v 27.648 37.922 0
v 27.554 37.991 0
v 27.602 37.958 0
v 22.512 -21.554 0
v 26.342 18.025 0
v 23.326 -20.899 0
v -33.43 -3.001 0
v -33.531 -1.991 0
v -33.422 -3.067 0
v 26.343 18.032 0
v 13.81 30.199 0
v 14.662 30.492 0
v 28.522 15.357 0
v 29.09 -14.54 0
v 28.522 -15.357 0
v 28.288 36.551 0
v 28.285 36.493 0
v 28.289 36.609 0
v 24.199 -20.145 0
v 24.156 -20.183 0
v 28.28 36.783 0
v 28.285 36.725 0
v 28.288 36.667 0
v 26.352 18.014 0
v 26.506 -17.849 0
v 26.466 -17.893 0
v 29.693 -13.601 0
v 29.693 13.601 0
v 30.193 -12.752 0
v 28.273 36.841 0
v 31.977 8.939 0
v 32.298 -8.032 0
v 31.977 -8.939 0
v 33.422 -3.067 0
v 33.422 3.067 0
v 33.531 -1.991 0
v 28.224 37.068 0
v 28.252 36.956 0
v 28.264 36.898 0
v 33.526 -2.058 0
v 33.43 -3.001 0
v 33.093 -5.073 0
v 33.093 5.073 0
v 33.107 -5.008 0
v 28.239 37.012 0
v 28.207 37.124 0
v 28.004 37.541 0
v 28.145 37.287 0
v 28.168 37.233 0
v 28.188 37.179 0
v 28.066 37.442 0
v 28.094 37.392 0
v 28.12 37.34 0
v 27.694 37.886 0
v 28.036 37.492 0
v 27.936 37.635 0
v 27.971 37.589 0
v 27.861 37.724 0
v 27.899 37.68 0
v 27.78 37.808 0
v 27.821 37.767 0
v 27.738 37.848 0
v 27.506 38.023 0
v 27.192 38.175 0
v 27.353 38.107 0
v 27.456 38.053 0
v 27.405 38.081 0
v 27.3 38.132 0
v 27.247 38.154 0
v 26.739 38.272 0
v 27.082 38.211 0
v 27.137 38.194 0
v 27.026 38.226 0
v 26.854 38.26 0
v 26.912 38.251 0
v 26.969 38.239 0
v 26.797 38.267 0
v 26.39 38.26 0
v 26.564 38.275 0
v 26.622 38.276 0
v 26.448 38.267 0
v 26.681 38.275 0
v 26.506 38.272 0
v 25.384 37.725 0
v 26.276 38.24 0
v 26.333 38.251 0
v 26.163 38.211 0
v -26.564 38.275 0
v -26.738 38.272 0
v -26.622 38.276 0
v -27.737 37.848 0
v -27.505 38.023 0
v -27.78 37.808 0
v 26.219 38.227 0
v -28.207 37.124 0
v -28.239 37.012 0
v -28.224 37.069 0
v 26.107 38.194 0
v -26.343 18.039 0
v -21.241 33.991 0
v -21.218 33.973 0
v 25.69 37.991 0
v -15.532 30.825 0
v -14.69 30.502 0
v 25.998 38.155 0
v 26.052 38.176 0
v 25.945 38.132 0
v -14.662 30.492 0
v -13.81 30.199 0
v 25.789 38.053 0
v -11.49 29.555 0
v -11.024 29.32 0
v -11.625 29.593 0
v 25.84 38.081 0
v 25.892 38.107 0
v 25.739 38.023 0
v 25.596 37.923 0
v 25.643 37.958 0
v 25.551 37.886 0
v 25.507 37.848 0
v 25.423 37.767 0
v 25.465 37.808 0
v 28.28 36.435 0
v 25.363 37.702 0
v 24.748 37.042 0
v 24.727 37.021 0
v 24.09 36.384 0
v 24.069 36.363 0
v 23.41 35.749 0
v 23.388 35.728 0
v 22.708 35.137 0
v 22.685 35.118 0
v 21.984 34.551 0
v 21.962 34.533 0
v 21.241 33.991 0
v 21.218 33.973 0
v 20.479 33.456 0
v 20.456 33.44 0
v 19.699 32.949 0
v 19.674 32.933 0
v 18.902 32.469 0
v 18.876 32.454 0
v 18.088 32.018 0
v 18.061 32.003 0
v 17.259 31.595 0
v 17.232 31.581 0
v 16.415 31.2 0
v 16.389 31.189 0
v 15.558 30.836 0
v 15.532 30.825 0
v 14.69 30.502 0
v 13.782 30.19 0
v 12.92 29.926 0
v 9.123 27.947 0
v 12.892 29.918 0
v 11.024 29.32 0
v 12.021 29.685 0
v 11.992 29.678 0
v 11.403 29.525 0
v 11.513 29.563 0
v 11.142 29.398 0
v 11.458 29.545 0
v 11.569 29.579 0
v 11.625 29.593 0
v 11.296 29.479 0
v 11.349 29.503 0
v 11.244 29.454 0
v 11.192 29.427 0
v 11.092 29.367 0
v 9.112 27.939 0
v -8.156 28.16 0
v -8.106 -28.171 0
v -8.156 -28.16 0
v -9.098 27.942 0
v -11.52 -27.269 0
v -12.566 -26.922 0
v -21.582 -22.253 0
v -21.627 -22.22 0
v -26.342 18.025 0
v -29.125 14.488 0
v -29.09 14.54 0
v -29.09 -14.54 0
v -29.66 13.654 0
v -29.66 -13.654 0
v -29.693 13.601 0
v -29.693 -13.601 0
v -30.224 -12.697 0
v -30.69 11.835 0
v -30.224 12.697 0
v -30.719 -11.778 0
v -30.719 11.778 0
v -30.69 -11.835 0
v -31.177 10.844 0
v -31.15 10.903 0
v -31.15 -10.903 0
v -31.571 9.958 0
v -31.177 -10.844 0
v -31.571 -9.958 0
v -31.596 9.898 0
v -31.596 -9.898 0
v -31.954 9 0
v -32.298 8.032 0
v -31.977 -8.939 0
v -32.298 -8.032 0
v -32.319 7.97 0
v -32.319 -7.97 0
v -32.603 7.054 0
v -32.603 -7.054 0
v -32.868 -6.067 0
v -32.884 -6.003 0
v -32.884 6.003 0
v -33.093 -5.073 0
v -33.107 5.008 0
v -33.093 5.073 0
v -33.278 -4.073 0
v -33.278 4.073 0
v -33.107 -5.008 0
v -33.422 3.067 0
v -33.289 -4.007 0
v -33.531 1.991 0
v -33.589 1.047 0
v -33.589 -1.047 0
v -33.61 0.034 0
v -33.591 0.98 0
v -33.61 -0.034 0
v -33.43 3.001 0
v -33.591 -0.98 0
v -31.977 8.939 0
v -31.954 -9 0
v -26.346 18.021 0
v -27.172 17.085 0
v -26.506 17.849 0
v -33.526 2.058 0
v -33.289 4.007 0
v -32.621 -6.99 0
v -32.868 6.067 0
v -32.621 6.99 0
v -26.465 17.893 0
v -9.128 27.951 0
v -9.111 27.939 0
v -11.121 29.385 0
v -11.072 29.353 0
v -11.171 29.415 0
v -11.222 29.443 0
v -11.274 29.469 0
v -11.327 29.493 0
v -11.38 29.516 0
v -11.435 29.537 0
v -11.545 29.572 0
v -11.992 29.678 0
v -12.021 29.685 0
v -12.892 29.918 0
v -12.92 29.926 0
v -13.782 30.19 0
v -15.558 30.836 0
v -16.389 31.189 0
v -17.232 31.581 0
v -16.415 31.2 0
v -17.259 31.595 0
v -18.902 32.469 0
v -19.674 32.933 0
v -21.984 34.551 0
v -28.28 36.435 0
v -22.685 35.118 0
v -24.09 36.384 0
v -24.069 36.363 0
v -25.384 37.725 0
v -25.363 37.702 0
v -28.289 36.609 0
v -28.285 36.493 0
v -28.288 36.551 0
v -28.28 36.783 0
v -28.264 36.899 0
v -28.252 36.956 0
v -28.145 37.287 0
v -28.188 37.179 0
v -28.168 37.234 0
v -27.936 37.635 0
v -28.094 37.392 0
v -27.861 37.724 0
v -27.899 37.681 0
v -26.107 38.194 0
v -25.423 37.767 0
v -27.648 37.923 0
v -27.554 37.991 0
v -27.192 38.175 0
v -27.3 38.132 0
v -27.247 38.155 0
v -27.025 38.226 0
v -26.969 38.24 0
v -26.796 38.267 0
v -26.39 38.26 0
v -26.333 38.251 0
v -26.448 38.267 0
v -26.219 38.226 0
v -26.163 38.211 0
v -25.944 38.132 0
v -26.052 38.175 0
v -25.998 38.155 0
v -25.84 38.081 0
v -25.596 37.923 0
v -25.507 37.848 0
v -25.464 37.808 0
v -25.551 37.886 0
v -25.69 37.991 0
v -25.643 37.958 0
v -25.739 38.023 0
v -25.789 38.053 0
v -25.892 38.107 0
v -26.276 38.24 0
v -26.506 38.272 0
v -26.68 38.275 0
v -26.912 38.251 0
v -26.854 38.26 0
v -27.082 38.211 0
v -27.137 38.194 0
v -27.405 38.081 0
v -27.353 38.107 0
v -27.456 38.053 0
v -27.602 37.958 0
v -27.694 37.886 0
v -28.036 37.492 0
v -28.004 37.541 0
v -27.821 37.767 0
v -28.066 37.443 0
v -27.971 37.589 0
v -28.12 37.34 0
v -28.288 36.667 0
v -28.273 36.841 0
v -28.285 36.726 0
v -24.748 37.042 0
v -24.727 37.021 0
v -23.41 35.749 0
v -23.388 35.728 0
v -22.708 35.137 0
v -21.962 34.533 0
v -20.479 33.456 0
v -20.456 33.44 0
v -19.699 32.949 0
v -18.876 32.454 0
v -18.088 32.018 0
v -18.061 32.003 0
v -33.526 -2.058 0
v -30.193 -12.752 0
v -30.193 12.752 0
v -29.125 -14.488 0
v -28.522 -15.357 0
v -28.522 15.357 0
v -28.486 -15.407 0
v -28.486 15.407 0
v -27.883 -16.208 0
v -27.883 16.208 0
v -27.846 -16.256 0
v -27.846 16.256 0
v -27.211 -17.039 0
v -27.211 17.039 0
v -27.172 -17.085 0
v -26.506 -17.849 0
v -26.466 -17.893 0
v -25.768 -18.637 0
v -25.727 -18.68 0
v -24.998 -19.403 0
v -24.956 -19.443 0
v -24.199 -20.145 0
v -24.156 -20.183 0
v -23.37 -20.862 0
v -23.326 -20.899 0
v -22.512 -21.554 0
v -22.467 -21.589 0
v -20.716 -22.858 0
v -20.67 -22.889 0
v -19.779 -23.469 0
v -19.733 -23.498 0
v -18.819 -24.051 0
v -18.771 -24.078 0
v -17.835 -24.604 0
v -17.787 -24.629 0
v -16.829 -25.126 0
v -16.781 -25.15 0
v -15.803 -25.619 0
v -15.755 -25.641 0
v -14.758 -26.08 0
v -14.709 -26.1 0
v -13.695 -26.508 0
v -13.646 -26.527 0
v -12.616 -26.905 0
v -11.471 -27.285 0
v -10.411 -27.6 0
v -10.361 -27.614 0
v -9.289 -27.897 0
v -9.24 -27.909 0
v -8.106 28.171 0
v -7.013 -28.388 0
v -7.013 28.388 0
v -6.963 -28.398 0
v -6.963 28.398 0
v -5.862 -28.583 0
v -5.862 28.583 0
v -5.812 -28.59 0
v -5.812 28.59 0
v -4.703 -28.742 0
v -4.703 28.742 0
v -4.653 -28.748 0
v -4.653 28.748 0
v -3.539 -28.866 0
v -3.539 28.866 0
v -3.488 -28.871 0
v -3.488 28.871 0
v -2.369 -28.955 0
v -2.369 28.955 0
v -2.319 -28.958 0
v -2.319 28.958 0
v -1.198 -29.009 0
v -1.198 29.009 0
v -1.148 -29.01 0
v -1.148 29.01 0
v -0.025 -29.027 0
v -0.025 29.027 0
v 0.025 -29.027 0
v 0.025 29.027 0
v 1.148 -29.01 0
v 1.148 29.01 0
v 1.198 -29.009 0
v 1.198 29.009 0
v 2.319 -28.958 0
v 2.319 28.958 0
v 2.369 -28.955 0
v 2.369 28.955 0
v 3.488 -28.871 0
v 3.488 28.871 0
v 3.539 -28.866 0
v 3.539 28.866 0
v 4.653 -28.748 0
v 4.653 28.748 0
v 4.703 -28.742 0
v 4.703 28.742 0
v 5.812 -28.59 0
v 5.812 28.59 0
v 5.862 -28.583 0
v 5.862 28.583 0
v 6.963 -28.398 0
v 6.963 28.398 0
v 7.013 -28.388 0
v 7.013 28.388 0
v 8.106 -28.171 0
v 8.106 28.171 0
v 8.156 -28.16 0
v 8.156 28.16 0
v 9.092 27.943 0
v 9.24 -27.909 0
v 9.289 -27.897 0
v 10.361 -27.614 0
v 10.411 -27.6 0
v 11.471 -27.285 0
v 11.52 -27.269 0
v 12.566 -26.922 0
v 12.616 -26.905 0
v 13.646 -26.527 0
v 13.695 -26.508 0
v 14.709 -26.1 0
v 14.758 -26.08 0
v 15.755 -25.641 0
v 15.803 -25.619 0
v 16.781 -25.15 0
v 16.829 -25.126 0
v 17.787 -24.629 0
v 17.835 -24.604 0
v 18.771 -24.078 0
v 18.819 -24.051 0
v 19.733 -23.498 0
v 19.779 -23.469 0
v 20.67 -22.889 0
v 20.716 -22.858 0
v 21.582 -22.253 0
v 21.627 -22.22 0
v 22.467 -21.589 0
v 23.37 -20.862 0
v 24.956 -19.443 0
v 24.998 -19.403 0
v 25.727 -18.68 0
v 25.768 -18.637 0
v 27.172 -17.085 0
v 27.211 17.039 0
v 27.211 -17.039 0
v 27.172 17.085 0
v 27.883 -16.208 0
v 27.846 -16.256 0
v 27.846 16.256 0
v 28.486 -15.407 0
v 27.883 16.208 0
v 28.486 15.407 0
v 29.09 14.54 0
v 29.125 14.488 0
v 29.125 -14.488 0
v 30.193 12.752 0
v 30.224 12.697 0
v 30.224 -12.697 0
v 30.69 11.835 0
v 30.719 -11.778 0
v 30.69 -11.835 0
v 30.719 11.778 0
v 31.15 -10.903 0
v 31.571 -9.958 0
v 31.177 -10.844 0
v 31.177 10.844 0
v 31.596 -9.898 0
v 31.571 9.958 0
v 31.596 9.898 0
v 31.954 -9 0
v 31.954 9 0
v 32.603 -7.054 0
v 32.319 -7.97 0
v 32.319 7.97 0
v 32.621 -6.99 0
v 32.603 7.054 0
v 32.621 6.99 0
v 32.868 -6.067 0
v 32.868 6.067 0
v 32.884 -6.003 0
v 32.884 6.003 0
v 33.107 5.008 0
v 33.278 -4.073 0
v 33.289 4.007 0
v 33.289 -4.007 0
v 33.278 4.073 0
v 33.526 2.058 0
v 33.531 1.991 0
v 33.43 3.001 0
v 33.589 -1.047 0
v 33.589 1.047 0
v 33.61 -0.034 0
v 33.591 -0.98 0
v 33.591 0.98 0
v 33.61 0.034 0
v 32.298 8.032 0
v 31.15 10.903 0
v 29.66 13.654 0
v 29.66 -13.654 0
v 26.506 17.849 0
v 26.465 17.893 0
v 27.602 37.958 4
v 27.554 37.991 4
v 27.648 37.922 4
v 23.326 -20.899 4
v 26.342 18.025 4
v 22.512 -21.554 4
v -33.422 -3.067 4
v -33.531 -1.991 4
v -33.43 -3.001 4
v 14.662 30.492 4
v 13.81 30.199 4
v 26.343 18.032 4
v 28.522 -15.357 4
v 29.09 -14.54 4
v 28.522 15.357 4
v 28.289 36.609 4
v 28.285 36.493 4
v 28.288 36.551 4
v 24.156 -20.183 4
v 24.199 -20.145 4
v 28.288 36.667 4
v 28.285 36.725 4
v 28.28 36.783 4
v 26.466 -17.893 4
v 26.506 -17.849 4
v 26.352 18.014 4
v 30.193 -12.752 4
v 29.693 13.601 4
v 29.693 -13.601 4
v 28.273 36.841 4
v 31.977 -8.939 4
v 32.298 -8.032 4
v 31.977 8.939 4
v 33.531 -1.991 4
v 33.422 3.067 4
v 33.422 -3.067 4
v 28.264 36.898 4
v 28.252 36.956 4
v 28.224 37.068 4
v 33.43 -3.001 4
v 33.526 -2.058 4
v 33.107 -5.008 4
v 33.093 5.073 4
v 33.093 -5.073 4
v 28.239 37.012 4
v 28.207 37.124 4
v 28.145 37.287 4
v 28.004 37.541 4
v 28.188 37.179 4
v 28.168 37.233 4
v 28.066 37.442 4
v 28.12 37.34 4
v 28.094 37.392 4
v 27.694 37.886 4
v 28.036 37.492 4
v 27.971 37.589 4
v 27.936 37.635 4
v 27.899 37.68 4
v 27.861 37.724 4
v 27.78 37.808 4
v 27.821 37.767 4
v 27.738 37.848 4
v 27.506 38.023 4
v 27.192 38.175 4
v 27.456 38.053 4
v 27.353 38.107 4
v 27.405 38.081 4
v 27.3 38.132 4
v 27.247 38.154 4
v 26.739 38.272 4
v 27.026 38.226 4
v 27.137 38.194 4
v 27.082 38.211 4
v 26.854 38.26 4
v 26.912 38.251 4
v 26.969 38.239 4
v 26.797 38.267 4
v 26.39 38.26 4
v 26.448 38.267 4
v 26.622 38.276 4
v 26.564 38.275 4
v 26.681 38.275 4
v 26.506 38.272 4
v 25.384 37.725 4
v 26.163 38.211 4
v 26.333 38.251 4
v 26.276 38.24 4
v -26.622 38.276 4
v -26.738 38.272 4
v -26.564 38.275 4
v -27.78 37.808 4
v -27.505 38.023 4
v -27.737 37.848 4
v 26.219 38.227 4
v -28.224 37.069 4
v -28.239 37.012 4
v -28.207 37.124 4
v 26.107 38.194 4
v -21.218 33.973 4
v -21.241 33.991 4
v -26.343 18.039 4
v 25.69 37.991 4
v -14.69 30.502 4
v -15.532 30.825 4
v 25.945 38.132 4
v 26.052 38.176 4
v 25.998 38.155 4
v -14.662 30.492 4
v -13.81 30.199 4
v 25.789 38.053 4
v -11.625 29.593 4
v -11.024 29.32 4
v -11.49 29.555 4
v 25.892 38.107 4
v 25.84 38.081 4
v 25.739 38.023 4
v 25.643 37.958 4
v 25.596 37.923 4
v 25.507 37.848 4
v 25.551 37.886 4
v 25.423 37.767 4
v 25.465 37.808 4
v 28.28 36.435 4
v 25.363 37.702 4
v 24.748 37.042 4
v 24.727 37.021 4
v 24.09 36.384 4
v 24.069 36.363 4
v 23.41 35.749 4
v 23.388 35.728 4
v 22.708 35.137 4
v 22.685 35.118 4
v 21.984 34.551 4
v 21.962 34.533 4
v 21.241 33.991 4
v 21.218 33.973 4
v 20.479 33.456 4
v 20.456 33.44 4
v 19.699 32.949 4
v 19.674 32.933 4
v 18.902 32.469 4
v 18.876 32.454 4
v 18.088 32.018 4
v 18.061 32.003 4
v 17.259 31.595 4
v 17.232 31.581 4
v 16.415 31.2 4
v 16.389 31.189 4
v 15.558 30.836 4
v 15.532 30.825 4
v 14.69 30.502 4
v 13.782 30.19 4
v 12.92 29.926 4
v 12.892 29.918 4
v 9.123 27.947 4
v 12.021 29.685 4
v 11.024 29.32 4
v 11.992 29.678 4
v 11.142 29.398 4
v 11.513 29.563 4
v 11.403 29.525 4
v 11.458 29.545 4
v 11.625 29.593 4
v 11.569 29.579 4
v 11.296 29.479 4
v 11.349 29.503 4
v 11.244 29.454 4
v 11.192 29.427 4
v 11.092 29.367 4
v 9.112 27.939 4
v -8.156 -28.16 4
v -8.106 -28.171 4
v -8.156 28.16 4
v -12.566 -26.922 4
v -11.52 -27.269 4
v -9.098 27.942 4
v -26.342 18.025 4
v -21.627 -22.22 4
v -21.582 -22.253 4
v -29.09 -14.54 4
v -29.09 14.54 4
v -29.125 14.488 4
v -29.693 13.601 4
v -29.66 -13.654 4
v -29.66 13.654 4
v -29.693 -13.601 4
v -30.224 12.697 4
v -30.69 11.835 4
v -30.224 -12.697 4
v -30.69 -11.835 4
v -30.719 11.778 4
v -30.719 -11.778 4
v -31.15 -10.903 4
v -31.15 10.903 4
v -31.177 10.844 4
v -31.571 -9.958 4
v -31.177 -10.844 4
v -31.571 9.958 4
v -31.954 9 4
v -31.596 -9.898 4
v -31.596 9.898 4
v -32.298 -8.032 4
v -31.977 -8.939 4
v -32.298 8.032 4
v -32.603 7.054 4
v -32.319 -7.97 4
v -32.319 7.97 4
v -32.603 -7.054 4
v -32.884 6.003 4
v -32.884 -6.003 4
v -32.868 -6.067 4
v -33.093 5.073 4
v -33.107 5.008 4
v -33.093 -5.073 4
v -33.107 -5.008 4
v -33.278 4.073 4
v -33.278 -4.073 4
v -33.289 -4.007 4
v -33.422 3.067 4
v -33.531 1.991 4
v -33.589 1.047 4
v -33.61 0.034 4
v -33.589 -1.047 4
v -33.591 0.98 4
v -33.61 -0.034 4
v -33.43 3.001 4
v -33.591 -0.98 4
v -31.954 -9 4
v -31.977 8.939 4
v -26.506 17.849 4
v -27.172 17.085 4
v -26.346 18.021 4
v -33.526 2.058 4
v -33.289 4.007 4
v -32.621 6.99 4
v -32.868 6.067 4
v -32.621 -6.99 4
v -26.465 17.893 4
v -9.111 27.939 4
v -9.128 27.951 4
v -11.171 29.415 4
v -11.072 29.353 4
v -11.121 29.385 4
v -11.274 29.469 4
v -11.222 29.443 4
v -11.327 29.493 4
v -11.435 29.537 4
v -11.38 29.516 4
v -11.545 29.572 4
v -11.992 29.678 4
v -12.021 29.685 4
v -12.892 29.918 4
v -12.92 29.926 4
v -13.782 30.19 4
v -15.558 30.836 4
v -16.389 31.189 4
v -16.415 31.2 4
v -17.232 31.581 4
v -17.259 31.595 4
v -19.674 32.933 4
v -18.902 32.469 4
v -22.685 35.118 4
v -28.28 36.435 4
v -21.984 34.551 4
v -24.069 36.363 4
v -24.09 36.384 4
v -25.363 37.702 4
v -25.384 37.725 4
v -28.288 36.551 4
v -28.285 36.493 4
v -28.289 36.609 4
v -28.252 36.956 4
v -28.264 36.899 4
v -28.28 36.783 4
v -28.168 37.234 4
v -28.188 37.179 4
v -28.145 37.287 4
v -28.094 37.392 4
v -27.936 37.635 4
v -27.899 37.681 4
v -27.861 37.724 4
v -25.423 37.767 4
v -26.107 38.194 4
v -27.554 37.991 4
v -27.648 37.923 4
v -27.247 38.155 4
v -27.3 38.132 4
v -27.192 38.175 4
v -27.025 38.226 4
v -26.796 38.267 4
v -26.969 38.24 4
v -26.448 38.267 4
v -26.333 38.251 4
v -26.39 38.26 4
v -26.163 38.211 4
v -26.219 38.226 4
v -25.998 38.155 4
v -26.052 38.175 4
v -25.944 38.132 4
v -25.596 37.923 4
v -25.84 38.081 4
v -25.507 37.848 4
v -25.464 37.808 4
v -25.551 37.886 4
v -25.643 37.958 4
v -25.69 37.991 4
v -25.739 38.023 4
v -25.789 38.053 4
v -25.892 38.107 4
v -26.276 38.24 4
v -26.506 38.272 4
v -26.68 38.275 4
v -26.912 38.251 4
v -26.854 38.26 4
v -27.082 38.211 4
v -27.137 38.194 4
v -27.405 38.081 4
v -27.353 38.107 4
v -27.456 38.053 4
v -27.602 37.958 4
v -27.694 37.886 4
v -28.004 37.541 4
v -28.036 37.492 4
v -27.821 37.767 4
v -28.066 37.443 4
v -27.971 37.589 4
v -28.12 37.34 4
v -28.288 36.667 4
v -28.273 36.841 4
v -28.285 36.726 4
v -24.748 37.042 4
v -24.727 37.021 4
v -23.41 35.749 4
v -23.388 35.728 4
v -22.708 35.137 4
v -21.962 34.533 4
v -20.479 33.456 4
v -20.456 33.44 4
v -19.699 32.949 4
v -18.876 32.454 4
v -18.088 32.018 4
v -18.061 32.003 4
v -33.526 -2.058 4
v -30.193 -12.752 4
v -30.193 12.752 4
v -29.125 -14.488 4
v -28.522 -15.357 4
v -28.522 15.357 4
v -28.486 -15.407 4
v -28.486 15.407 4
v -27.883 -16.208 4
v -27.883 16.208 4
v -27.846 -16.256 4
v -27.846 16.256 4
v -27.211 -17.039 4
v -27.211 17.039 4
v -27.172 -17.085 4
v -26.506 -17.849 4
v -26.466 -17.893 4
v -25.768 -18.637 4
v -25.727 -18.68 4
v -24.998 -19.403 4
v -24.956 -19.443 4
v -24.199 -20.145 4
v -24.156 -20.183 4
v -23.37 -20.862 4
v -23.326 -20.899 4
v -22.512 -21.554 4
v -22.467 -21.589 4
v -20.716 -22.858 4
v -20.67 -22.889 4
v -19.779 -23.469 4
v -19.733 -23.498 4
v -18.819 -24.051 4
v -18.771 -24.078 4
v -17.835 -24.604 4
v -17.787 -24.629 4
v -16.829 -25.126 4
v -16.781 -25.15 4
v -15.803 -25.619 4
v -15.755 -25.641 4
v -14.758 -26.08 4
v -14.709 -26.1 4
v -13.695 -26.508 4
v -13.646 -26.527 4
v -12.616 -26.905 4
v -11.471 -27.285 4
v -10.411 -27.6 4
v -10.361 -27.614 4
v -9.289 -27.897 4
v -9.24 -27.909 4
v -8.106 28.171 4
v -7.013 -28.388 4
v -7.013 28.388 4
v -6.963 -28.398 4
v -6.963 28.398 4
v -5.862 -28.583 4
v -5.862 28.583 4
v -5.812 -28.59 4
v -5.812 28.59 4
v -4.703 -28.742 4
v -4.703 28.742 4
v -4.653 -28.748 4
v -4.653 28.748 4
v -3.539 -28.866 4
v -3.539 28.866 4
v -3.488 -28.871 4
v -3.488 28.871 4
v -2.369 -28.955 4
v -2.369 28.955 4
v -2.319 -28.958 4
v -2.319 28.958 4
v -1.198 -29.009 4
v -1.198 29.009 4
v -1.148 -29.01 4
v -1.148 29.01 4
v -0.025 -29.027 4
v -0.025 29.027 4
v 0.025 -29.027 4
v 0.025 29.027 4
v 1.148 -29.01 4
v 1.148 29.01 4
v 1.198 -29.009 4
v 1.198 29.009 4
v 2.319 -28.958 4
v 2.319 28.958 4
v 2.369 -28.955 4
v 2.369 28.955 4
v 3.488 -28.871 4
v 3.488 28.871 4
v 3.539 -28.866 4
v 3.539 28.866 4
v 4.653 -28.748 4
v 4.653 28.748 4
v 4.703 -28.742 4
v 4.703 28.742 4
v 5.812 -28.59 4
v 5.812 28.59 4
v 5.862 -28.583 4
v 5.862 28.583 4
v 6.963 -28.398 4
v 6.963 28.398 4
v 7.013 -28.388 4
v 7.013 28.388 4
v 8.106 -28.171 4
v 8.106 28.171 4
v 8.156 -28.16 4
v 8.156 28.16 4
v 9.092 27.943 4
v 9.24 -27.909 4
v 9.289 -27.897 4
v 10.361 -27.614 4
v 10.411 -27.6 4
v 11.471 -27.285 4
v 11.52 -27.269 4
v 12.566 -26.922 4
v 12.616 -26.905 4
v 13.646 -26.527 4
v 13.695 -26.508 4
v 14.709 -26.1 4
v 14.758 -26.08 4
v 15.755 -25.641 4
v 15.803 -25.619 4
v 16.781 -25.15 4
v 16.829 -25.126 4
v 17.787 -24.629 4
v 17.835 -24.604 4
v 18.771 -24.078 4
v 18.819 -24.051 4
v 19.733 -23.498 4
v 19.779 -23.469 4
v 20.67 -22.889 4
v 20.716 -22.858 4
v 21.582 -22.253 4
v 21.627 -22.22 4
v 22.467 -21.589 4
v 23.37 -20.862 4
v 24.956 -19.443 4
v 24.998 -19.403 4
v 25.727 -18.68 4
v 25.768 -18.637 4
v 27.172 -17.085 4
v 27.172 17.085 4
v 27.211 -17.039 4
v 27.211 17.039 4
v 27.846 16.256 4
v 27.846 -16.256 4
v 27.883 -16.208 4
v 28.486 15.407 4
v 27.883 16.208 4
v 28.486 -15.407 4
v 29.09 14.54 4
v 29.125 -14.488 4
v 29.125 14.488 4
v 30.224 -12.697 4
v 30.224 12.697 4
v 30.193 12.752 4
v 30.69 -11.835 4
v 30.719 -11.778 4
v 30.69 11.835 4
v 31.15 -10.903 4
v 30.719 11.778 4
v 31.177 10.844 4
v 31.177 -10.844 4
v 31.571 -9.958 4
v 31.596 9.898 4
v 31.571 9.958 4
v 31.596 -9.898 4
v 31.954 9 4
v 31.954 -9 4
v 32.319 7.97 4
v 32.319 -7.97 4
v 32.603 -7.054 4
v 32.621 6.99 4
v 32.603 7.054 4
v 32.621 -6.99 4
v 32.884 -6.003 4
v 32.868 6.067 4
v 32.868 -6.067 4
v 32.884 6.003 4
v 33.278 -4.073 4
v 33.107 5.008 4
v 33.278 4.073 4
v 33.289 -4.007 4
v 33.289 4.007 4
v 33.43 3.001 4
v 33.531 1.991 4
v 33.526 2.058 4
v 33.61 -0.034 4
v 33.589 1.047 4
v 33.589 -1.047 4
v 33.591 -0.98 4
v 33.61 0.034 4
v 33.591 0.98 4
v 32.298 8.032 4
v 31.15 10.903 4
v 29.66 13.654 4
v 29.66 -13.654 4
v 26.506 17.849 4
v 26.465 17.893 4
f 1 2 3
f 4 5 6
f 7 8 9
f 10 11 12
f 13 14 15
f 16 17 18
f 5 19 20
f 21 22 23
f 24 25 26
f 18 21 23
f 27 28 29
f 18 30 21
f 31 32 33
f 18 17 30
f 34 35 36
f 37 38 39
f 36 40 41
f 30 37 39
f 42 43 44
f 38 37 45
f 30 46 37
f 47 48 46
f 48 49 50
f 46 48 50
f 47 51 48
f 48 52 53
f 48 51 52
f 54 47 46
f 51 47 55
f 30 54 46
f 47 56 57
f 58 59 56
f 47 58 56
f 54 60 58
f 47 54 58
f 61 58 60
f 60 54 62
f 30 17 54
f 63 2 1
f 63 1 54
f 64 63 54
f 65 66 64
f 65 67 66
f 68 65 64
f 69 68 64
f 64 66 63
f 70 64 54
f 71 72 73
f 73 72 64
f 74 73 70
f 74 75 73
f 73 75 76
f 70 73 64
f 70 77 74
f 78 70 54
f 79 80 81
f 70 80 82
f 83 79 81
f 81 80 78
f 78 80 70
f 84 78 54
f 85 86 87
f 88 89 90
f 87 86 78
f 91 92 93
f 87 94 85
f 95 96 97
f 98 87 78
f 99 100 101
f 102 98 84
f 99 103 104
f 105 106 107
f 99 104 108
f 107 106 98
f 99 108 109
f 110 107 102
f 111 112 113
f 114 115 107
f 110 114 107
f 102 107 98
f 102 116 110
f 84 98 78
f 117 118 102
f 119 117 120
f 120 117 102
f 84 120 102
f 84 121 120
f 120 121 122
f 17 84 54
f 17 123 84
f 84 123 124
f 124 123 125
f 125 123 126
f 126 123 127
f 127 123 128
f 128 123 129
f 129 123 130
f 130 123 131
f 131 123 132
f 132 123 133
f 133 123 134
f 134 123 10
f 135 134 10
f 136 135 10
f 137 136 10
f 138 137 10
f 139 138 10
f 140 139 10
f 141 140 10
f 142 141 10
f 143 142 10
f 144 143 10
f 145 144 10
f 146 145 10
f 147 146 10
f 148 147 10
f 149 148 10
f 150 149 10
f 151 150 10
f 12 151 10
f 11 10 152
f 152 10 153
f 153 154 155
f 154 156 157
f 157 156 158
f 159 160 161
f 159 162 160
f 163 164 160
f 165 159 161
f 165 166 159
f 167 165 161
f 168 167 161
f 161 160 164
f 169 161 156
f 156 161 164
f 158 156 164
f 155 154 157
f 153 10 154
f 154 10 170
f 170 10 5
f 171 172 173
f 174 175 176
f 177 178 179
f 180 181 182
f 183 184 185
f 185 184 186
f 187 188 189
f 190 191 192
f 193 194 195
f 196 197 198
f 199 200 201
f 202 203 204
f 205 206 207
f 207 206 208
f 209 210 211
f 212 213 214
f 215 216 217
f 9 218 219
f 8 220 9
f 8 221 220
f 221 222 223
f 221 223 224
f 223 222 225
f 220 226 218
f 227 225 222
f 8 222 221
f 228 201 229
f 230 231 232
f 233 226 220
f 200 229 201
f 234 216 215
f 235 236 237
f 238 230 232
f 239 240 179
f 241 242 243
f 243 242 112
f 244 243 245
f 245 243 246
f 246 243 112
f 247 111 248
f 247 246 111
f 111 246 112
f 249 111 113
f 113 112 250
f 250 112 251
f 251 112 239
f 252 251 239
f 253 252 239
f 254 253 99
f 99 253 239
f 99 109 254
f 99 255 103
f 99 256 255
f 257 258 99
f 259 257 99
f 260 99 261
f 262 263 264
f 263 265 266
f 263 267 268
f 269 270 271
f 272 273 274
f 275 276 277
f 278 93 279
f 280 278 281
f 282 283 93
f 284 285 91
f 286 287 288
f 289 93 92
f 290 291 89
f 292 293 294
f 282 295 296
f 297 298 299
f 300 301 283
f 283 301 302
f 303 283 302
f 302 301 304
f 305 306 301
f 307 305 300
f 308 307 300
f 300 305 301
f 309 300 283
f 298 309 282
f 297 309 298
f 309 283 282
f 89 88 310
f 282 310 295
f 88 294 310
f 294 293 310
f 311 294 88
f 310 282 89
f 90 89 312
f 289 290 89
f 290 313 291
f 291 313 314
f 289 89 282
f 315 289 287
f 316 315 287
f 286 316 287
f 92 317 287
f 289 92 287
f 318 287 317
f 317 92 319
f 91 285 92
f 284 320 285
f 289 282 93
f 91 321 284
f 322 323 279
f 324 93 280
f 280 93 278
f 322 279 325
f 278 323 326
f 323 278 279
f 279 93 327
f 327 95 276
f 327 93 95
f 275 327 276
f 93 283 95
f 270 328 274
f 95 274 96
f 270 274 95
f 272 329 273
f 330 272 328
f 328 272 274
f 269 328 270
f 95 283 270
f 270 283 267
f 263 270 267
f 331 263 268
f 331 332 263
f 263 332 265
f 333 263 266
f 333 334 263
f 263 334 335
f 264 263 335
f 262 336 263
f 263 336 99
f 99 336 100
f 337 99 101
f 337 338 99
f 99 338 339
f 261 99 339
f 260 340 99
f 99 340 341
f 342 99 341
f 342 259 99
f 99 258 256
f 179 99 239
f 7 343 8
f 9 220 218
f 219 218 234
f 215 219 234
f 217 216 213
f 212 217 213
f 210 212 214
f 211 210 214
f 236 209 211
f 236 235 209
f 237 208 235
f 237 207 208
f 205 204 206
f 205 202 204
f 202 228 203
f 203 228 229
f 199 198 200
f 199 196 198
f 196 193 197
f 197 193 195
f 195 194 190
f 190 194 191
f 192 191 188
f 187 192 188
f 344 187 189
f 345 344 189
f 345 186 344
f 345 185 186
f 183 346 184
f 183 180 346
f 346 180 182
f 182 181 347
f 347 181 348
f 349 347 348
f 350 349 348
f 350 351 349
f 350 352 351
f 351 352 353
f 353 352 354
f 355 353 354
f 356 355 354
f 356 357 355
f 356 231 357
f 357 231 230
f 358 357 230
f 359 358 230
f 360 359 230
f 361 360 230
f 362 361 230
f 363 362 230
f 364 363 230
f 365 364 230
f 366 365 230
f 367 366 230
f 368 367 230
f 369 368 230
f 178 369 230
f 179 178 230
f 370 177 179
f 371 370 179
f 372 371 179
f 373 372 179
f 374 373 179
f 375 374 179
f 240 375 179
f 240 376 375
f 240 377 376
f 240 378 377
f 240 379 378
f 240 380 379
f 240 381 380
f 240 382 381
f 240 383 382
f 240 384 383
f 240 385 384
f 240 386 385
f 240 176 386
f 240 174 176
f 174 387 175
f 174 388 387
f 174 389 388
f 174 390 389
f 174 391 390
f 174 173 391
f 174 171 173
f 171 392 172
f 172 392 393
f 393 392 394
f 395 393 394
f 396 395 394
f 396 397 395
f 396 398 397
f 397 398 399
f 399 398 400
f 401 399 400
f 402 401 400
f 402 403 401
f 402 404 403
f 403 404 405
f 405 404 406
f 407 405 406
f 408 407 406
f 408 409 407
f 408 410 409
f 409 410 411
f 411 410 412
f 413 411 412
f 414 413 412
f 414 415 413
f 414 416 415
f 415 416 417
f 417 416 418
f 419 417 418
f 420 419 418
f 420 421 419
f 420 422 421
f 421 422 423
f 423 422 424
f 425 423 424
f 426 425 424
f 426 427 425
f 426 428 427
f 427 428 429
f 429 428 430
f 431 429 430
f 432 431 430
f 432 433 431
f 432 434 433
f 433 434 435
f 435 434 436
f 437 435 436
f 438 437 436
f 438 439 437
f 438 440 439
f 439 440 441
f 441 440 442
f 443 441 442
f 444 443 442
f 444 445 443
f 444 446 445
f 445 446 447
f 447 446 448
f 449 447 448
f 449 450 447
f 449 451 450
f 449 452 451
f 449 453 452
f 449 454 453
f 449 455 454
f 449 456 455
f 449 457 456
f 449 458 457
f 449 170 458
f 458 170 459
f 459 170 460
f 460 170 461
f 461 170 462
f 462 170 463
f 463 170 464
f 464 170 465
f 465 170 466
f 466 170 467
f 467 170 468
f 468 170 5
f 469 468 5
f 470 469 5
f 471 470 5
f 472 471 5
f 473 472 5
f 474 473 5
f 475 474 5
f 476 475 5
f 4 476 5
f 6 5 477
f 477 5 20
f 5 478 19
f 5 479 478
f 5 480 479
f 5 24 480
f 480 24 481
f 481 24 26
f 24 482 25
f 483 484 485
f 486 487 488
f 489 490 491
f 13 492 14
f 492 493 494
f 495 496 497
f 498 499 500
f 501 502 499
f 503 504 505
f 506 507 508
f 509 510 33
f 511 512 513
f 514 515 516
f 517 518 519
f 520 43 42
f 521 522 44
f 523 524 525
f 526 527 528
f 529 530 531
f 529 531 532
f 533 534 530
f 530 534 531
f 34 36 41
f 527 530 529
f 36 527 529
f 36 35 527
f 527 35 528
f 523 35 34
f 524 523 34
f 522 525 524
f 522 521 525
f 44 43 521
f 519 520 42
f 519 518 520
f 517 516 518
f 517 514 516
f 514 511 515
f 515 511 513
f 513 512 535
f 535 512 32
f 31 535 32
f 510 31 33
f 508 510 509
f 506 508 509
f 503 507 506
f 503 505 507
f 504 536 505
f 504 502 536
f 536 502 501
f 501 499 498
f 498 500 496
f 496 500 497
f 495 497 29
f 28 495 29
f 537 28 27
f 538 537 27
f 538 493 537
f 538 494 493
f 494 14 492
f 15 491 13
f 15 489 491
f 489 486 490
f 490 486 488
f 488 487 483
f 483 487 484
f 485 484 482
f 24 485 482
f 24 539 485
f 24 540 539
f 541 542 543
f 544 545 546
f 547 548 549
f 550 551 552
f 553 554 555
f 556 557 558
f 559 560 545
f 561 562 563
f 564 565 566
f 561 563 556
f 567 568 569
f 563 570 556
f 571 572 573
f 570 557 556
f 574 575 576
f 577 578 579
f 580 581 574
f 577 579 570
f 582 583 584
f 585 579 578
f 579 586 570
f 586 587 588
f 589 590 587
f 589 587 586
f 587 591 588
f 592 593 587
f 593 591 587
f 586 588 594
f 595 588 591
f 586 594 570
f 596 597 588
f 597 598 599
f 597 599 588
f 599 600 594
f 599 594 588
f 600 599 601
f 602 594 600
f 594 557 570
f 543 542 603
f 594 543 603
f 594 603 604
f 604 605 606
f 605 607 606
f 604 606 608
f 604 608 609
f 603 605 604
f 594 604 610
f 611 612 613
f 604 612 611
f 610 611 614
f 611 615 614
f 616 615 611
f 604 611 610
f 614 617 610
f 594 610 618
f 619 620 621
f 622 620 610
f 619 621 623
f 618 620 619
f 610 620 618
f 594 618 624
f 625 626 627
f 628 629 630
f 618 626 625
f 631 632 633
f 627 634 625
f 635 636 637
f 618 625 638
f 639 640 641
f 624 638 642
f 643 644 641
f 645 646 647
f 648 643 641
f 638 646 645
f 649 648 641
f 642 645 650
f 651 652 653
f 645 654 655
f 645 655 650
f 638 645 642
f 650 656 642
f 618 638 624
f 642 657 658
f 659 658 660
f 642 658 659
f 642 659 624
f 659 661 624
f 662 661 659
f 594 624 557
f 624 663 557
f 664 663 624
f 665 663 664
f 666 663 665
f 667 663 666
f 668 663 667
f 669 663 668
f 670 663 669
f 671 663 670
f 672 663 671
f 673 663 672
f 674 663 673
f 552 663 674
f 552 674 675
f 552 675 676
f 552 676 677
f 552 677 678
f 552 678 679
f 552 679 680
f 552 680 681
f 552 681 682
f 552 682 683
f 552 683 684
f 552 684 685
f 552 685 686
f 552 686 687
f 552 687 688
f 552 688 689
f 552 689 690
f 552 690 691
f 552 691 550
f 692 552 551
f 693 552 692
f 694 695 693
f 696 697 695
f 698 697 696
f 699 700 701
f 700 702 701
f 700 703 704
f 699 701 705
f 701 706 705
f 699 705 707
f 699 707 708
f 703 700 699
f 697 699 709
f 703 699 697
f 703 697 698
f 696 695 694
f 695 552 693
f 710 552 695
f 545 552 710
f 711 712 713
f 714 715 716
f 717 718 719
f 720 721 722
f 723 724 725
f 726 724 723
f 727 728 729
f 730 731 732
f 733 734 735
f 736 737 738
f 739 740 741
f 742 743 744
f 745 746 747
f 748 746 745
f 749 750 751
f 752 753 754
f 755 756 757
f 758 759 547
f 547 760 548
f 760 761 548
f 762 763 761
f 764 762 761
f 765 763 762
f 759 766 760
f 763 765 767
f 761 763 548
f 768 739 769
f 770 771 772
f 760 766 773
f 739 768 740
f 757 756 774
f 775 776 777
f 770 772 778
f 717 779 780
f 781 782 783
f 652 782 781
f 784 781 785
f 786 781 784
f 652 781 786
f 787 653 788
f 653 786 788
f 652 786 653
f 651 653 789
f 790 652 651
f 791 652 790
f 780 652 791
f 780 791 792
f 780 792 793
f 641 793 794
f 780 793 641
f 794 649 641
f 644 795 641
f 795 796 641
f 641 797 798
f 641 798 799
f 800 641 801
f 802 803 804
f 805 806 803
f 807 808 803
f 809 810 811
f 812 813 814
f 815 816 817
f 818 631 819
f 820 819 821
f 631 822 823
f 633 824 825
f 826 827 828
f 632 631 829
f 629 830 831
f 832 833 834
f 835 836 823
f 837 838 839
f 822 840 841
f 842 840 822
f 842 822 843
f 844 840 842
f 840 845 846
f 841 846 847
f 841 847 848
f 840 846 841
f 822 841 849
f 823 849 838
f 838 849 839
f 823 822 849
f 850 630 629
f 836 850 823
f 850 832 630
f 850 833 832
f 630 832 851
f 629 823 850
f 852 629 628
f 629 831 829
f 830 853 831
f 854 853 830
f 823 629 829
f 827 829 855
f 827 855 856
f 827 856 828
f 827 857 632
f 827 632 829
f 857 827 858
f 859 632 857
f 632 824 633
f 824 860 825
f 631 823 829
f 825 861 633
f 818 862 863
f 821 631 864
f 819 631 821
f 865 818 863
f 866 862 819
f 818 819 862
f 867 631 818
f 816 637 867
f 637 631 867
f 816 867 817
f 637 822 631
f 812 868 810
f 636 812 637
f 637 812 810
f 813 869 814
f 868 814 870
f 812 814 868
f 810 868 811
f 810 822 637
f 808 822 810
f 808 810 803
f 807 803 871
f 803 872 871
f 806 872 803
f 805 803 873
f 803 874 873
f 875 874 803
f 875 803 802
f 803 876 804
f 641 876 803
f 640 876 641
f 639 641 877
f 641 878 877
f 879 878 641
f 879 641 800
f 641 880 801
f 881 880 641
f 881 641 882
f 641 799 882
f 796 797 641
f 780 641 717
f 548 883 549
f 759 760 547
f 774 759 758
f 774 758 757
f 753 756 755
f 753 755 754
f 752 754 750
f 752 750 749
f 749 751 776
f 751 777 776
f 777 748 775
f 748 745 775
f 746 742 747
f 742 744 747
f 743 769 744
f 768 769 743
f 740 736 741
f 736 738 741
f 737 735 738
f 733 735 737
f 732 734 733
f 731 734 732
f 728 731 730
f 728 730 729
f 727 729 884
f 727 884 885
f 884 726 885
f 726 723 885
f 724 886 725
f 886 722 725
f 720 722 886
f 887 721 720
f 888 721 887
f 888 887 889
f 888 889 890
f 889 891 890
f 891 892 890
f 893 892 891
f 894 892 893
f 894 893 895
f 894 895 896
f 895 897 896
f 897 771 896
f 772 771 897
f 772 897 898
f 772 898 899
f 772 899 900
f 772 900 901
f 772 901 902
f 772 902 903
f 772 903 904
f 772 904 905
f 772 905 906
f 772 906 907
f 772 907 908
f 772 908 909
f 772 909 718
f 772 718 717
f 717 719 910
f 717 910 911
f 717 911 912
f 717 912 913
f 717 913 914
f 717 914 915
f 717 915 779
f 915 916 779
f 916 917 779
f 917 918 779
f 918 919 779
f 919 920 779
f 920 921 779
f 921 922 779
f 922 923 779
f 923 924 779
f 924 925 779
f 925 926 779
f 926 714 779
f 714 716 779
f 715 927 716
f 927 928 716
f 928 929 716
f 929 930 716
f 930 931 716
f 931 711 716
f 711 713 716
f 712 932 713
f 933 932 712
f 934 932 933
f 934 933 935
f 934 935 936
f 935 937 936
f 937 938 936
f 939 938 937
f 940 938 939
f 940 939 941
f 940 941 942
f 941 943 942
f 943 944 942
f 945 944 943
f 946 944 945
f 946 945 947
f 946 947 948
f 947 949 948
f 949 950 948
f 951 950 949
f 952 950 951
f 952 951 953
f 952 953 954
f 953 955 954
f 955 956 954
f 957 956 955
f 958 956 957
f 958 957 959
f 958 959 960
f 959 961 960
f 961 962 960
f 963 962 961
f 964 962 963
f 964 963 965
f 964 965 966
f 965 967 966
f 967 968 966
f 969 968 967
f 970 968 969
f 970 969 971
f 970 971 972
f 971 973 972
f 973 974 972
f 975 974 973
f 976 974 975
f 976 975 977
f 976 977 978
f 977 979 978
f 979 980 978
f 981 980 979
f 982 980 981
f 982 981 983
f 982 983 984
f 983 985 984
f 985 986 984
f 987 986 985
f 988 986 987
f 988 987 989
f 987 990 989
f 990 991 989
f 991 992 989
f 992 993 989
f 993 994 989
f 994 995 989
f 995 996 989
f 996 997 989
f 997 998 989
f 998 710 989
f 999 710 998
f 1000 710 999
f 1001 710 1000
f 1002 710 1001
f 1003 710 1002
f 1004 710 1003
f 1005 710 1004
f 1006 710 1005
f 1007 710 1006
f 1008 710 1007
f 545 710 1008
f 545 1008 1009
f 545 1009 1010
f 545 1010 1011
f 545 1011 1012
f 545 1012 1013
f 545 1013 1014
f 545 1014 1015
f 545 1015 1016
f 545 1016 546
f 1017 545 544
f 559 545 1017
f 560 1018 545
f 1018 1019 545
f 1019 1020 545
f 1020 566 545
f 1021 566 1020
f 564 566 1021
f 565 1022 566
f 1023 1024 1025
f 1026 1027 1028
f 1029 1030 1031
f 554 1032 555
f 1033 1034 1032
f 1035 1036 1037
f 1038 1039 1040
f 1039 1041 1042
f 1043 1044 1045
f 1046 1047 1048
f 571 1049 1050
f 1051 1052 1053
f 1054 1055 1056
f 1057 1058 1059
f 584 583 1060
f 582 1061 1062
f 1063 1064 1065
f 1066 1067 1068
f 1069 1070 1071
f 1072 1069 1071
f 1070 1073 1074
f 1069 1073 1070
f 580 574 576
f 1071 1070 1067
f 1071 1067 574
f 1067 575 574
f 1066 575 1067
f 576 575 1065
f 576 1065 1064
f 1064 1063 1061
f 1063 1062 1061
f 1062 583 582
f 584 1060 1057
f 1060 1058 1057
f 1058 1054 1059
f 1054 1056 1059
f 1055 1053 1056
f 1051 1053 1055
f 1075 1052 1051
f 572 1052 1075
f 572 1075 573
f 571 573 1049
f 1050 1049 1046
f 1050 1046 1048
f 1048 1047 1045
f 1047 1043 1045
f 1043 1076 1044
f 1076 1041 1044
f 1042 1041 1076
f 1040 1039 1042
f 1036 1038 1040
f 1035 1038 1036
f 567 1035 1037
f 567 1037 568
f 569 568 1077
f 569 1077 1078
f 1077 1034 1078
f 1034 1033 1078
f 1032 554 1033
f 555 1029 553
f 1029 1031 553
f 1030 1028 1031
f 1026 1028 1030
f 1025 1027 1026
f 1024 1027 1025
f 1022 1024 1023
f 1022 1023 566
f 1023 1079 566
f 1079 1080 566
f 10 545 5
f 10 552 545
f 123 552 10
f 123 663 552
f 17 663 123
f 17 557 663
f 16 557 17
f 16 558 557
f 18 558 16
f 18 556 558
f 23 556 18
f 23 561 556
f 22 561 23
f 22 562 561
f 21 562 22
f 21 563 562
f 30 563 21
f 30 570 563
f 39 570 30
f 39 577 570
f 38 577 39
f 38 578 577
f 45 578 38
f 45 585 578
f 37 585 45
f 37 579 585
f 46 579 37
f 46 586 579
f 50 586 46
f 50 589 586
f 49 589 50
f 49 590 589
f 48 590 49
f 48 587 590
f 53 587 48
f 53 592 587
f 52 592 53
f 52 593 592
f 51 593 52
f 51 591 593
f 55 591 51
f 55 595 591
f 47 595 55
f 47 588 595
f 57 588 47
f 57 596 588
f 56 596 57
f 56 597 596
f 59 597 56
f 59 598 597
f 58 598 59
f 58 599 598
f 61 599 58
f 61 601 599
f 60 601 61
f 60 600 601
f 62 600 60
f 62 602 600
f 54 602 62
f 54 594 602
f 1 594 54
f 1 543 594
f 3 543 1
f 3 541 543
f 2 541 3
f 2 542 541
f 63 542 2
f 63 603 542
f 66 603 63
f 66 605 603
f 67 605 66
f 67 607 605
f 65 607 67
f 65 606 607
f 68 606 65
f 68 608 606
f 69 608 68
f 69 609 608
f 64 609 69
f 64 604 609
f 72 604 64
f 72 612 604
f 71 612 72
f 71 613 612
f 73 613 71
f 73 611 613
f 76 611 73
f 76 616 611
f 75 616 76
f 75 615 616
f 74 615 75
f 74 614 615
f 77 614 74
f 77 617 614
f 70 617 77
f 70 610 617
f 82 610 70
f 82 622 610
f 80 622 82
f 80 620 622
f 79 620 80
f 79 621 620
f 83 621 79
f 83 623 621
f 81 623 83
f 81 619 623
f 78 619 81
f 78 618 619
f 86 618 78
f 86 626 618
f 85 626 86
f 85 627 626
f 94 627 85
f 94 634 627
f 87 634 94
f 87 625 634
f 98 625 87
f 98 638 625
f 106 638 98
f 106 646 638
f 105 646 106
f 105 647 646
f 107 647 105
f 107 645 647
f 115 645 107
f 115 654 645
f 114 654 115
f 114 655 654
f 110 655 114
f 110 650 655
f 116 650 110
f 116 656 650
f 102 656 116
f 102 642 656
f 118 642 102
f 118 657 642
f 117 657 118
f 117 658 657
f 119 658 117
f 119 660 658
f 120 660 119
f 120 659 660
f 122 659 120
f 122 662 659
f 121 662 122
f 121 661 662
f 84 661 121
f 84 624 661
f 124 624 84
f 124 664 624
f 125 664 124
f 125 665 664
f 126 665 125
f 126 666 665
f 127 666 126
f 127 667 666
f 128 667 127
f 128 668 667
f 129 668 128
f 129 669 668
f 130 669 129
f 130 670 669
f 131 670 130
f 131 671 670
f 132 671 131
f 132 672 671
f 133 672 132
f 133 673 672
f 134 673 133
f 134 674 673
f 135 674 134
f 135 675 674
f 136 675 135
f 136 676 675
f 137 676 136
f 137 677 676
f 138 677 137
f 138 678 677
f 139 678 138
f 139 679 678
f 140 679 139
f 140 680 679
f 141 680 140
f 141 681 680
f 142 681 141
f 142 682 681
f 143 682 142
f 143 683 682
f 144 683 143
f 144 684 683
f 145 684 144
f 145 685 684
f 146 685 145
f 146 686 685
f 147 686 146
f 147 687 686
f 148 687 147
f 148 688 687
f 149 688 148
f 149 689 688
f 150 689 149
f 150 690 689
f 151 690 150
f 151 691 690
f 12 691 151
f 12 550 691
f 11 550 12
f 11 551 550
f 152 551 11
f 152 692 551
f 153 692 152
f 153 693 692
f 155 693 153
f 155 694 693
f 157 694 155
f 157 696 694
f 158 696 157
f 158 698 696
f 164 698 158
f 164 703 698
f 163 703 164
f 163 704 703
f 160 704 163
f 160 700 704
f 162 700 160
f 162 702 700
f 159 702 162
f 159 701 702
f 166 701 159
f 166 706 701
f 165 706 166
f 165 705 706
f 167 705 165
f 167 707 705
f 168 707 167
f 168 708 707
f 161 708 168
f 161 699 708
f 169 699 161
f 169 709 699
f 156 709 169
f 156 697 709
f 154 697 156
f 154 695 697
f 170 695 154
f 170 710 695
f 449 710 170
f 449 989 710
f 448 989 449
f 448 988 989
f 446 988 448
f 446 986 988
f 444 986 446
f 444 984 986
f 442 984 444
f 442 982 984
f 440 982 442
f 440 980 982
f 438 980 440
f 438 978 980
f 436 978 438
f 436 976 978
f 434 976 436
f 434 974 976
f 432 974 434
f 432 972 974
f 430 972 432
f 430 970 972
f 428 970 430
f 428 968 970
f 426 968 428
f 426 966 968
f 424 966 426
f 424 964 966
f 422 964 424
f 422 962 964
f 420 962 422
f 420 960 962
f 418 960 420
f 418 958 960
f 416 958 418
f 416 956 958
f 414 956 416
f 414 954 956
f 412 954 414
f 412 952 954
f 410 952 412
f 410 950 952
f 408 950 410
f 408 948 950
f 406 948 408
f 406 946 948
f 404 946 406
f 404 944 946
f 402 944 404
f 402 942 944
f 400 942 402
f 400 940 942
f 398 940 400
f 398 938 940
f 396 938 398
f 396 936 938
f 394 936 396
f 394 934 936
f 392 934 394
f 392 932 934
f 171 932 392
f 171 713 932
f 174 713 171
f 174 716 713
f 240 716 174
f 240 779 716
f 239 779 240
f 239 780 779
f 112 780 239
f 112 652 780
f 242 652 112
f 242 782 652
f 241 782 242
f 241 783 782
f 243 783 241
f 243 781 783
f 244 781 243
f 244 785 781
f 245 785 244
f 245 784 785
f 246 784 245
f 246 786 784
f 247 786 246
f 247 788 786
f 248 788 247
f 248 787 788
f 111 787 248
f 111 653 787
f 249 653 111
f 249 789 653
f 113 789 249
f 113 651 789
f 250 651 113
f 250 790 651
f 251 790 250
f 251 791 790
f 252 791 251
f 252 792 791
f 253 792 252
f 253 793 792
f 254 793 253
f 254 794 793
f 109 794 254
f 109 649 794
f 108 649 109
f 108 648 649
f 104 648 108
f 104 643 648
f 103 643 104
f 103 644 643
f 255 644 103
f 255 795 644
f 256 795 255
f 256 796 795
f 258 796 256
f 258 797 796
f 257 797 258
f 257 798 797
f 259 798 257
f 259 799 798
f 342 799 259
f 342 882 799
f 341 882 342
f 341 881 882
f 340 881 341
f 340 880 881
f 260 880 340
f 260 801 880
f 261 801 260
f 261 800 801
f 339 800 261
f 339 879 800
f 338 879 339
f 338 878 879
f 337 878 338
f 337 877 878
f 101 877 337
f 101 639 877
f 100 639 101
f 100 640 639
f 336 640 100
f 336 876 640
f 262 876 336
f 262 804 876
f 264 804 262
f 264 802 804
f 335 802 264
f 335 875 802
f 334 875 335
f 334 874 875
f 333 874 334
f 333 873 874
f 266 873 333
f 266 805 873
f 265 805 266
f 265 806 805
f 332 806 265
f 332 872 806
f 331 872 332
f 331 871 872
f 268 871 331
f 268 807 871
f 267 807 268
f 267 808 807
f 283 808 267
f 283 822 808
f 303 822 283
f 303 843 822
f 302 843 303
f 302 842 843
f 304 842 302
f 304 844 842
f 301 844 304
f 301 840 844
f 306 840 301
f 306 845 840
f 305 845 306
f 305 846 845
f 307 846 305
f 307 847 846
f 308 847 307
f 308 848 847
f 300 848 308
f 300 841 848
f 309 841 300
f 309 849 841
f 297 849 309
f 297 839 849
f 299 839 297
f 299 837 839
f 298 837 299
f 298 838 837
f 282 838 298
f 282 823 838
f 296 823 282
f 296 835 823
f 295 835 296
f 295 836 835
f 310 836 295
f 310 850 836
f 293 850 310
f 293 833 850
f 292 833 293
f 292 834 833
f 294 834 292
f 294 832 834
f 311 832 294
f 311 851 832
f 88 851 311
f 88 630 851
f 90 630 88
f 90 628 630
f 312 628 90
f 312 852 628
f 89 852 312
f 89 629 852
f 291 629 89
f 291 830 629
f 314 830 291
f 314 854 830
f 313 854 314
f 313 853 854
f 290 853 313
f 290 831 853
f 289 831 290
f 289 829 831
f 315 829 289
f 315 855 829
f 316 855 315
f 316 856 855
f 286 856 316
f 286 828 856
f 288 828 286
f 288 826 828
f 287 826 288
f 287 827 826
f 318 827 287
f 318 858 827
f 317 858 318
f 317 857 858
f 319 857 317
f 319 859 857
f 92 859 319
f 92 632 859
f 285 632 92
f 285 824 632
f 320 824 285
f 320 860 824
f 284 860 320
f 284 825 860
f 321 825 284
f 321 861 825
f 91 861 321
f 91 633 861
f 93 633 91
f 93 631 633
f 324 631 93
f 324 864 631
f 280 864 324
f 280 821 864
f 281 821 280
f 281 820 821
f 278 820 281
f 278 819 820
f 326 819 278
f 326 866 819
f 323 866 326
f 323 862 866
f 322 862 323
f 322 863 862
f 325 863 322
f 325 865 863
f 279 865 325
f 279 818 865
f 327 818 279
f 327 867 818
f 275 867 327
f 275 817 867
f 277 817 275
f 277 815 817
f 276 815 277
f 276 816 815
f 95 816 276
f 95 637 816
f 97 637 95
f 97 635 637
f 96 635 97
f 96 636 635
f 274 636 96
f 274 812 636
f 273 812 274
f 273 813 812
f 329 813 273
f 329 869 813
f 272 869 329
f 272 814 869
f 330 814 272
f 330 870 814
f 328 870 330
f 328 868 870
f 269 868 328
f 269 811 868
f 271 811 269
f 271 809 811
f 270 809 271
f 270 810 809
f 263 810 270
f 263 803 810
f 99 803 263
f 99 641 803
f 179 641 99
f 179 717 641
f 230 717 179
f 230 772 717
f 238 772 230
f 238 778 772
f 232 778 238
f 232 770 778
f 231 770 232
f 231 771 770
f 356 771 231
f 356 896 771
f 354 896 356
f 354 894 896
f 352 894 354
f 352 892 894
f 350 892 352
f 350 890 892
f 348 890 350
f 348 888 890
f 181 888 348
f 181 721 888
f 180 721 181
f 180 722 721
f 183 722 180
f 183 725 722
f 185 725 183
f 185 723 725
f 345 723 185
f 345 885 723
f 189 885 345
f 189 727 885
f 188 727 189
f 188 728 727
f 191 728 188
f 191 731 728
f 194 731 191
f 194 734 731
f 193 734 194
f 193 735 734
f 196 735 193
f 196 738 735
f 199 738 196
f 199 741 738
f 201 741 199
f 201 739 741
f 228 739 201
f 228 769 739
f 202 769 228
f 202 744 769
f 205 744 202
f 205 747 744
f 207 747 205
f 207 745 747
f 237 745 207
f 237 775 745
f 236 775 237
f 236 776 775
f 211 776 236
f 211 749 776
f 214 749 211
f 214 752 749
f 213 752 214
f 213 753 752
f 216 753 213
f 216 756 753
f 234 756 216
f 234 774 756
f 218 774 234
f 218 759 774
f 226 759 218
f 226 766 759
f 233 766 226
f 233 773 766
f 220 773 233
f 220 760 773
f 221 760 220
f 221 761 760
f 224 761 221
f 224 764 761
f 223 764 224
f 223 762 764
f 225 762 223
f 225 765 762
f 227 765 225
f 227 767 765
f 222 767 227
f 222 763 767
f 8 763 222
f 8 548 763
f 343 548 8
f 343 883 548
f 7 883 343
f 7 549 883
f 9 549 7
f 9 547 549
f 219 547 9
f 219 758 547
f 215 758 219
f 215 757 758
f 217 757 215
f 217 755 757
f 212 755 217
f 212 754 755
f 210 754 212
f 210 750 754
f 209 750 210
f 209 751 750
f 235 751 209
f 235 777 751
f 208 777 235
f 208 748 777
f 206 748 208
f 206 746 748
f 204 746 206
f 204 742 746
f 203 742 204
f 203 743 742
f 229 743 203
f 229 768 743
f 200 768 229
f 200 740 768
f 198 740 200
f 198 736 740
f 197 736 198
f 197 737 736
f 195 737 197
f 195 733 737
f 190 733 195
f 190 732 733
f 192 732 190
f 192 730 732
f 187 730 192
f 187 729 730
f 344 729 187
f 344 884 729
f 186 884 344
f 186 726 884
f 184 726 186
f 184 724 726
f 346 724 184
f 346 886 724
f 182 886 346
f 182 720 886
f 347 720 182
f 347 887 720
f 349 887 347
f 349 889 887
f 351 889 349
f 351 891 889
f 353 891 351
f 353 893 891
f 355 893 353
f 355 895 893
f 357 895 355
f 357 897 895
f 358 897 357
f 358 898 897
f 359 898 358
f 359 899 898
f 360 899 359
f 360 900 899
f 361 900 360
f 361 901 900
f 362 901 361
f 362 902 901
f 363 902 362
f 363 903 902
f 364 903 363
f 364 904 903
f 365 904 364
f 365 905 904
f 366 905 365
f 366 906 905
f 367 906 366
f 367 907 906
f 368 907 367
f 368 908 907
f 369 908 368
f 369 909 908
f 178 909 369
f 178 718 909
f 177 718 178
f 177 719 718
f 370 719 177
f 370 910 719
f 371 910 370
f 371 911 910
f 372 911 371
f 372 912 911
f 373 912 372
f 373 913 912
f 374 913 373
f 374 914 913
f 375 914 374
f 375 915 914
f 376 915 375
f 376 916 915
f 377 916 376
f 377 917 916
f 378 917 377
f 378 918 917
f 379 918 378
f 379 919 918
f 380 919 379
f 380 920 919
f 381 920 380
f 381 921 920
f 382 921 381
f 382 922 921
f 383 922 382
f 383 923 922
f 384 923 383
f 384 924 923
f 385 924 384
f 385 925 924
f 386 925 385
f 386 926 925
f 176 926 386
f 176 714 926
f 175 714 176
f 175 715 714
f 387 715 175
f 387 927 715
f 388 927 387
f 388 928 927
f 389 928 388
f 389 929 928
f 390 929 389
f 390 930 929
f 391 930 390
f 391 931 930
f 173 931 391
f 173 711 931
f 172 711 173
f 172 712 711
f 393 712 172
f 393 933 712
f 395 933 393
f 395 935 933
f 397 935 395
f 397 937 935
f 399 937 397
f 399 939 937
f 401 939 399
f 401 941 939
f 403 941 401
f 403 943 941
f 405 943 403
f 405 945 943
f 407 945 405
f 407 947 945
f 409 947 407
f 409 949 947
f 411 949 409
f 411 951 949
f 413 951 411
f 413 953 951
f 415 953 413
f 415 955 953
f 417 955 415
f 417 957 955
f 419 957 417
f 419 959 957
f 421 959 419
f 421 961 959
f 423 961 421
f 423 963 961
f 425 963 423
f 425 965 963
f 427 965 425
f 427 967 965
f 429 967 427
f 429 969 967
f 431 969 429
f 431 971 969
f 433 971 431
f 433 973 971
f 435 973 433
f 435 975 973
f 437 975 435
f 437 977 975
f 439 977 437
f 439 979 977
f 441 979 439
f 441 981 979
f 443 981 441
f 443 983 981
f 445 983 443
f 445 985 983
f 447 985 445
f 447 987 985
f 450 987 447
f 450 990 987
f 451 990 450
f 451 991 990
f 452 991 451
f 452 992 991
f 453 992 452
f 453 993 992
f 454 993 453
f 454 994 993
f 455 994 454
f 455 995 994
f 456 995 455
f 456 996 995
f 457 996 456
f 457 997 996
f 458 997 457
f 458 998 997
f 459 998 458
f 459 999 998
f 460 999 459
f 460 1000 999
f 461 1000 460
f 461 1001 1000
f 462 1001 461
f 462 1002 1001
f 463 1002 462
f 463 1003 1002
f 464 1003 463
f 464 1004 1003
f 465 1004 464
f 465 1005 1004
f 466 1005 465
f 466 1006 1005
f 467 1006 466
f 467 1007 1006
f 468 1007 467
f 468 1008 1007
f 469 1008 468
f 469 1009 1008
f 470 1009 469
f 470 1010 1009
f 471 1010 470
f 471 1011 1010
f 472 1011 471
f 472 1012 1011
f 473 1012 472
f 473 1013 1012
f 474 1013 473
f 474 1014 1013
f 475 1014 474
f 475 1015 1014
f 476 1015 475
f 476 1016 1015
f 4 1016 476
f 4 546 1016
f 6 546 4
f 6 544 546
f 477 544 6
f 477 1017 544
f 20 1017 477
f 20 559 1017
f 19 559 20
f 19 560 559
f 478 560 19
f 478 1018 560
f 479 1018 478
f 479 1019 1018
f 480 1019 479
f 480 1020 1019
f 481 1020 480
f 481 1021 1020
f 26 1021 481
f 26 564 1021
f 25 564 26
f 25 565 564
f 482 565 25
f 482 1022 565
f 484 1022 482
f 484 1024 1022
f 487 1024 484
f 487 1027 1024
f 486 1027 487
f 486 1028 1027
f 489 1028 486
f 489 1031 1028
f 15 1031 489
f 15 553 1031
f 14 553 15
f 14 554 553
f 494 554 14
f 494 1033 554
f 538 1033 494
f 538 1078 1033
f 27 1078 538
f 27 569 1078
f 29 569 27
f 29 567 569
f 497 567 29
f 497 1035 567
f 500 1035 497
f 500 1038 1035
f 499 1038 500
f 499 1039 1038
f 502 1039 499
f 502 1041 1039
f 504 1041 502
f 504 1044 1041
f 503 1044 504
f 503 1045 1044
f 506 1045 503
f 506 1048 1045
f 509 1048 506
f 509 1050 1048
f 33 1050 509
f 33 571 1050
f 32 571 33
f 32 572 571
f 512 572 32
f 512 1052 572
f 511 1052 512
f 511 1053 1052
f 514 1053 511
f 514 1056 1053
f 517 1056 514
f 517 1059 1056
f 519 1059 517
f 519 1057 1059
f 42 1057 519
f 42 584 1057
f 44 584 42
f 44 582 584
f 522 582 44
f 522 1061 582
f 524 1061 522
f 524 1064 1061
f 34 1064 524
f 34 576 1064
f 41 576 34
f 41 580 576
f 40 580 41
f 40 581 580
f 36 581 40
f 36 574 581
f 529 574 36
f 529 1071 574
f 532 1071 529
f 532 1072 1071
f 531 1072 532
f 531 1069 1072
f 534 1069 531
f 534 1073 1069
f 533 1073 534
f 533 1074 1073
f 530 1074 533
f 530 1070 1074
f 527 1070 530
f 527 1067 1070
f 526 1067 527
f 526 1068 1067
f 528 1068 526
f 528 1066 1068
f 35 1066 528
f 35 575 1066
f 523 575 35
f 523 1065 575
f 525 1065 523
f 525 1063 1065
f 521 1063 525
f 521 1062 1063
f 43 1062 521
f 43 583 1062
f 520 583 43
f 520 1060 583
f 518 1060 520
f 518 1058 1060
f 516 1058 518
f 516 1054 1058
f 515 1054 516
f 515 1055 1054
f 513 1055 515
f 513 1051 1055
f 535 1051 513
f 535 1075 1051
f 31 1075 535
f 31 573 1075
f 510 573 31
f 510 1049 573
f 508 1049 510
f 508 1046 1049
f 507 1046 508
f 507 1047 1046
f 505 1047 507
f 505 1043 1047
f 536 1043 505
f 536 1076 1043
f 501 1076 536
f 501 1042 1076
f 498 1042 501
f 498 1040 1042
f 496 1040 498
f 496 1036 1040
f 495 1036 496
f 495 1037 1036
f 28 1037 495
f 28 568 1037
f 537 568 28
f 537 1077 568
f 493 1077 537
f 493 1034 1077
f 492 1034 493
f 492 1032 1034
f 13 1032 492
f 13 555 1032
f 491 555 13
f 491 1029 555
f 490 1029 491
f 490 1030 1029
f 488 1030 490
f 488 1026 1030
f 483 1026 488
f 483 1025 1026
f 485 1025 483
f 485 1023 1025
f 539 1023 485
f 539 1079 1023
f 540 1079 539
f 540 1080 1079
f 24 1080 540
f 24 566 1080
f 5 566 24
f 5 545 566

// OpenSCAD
// ============================================
// Cabeza de Gato - Versión Identica (Redonda)
// ============================================

total_w = 60;      // Ancho total deseado
thickness = 4;     // Grosor de la pieza
$fn = 180;         // Alta resolución para curvas perfectas

module silueta_gato_geometria() {
    // 1. Usamos offset para suavizar las uniones y las puntas de las orejas
    offset(r = 1.5) 
    offset(r = -1.5)
    difference() {
        union() {
            // LA CARA: Un círculo perfecto (ligeramente ensanchado para el look de la imagen)
            scale([1.1, 0.95]) 
                circle(d = 55);

            // LAS OREJAS: Polígonos que salen de la cabeza
            // Oreja derecha
            polygon([[8, 25], [26, 38], [22, 0]]);
            // Oreja izquierda (espejo de la derecha)
            mirror([1, 0, 0]) 
                polygon([[8, 25], [26, 38], [22, 0]]);
        }

        // EL PUENTE: Un círculo posicionado arriba que resta material 
        // para crear la curva cóncava suave entre las orejas.
        translate([-5, 50]) 
            circle(r = 24);
        translate([5, 50]) 
            circle(r = 24);
    }
}
module salida_final() {
    // Calculamos el factor de escala para respetar los 60mm
    // La geometría base tiene aprox 54mm de ancho con las orejas
    scale_factor = total_w / 54; 
    
    scale([scale_factor, scale_factor, 1])
    linear_extrude(height = thickness)
        silueta_gato_geometria();
}

// Ejecutar
salida_final();
